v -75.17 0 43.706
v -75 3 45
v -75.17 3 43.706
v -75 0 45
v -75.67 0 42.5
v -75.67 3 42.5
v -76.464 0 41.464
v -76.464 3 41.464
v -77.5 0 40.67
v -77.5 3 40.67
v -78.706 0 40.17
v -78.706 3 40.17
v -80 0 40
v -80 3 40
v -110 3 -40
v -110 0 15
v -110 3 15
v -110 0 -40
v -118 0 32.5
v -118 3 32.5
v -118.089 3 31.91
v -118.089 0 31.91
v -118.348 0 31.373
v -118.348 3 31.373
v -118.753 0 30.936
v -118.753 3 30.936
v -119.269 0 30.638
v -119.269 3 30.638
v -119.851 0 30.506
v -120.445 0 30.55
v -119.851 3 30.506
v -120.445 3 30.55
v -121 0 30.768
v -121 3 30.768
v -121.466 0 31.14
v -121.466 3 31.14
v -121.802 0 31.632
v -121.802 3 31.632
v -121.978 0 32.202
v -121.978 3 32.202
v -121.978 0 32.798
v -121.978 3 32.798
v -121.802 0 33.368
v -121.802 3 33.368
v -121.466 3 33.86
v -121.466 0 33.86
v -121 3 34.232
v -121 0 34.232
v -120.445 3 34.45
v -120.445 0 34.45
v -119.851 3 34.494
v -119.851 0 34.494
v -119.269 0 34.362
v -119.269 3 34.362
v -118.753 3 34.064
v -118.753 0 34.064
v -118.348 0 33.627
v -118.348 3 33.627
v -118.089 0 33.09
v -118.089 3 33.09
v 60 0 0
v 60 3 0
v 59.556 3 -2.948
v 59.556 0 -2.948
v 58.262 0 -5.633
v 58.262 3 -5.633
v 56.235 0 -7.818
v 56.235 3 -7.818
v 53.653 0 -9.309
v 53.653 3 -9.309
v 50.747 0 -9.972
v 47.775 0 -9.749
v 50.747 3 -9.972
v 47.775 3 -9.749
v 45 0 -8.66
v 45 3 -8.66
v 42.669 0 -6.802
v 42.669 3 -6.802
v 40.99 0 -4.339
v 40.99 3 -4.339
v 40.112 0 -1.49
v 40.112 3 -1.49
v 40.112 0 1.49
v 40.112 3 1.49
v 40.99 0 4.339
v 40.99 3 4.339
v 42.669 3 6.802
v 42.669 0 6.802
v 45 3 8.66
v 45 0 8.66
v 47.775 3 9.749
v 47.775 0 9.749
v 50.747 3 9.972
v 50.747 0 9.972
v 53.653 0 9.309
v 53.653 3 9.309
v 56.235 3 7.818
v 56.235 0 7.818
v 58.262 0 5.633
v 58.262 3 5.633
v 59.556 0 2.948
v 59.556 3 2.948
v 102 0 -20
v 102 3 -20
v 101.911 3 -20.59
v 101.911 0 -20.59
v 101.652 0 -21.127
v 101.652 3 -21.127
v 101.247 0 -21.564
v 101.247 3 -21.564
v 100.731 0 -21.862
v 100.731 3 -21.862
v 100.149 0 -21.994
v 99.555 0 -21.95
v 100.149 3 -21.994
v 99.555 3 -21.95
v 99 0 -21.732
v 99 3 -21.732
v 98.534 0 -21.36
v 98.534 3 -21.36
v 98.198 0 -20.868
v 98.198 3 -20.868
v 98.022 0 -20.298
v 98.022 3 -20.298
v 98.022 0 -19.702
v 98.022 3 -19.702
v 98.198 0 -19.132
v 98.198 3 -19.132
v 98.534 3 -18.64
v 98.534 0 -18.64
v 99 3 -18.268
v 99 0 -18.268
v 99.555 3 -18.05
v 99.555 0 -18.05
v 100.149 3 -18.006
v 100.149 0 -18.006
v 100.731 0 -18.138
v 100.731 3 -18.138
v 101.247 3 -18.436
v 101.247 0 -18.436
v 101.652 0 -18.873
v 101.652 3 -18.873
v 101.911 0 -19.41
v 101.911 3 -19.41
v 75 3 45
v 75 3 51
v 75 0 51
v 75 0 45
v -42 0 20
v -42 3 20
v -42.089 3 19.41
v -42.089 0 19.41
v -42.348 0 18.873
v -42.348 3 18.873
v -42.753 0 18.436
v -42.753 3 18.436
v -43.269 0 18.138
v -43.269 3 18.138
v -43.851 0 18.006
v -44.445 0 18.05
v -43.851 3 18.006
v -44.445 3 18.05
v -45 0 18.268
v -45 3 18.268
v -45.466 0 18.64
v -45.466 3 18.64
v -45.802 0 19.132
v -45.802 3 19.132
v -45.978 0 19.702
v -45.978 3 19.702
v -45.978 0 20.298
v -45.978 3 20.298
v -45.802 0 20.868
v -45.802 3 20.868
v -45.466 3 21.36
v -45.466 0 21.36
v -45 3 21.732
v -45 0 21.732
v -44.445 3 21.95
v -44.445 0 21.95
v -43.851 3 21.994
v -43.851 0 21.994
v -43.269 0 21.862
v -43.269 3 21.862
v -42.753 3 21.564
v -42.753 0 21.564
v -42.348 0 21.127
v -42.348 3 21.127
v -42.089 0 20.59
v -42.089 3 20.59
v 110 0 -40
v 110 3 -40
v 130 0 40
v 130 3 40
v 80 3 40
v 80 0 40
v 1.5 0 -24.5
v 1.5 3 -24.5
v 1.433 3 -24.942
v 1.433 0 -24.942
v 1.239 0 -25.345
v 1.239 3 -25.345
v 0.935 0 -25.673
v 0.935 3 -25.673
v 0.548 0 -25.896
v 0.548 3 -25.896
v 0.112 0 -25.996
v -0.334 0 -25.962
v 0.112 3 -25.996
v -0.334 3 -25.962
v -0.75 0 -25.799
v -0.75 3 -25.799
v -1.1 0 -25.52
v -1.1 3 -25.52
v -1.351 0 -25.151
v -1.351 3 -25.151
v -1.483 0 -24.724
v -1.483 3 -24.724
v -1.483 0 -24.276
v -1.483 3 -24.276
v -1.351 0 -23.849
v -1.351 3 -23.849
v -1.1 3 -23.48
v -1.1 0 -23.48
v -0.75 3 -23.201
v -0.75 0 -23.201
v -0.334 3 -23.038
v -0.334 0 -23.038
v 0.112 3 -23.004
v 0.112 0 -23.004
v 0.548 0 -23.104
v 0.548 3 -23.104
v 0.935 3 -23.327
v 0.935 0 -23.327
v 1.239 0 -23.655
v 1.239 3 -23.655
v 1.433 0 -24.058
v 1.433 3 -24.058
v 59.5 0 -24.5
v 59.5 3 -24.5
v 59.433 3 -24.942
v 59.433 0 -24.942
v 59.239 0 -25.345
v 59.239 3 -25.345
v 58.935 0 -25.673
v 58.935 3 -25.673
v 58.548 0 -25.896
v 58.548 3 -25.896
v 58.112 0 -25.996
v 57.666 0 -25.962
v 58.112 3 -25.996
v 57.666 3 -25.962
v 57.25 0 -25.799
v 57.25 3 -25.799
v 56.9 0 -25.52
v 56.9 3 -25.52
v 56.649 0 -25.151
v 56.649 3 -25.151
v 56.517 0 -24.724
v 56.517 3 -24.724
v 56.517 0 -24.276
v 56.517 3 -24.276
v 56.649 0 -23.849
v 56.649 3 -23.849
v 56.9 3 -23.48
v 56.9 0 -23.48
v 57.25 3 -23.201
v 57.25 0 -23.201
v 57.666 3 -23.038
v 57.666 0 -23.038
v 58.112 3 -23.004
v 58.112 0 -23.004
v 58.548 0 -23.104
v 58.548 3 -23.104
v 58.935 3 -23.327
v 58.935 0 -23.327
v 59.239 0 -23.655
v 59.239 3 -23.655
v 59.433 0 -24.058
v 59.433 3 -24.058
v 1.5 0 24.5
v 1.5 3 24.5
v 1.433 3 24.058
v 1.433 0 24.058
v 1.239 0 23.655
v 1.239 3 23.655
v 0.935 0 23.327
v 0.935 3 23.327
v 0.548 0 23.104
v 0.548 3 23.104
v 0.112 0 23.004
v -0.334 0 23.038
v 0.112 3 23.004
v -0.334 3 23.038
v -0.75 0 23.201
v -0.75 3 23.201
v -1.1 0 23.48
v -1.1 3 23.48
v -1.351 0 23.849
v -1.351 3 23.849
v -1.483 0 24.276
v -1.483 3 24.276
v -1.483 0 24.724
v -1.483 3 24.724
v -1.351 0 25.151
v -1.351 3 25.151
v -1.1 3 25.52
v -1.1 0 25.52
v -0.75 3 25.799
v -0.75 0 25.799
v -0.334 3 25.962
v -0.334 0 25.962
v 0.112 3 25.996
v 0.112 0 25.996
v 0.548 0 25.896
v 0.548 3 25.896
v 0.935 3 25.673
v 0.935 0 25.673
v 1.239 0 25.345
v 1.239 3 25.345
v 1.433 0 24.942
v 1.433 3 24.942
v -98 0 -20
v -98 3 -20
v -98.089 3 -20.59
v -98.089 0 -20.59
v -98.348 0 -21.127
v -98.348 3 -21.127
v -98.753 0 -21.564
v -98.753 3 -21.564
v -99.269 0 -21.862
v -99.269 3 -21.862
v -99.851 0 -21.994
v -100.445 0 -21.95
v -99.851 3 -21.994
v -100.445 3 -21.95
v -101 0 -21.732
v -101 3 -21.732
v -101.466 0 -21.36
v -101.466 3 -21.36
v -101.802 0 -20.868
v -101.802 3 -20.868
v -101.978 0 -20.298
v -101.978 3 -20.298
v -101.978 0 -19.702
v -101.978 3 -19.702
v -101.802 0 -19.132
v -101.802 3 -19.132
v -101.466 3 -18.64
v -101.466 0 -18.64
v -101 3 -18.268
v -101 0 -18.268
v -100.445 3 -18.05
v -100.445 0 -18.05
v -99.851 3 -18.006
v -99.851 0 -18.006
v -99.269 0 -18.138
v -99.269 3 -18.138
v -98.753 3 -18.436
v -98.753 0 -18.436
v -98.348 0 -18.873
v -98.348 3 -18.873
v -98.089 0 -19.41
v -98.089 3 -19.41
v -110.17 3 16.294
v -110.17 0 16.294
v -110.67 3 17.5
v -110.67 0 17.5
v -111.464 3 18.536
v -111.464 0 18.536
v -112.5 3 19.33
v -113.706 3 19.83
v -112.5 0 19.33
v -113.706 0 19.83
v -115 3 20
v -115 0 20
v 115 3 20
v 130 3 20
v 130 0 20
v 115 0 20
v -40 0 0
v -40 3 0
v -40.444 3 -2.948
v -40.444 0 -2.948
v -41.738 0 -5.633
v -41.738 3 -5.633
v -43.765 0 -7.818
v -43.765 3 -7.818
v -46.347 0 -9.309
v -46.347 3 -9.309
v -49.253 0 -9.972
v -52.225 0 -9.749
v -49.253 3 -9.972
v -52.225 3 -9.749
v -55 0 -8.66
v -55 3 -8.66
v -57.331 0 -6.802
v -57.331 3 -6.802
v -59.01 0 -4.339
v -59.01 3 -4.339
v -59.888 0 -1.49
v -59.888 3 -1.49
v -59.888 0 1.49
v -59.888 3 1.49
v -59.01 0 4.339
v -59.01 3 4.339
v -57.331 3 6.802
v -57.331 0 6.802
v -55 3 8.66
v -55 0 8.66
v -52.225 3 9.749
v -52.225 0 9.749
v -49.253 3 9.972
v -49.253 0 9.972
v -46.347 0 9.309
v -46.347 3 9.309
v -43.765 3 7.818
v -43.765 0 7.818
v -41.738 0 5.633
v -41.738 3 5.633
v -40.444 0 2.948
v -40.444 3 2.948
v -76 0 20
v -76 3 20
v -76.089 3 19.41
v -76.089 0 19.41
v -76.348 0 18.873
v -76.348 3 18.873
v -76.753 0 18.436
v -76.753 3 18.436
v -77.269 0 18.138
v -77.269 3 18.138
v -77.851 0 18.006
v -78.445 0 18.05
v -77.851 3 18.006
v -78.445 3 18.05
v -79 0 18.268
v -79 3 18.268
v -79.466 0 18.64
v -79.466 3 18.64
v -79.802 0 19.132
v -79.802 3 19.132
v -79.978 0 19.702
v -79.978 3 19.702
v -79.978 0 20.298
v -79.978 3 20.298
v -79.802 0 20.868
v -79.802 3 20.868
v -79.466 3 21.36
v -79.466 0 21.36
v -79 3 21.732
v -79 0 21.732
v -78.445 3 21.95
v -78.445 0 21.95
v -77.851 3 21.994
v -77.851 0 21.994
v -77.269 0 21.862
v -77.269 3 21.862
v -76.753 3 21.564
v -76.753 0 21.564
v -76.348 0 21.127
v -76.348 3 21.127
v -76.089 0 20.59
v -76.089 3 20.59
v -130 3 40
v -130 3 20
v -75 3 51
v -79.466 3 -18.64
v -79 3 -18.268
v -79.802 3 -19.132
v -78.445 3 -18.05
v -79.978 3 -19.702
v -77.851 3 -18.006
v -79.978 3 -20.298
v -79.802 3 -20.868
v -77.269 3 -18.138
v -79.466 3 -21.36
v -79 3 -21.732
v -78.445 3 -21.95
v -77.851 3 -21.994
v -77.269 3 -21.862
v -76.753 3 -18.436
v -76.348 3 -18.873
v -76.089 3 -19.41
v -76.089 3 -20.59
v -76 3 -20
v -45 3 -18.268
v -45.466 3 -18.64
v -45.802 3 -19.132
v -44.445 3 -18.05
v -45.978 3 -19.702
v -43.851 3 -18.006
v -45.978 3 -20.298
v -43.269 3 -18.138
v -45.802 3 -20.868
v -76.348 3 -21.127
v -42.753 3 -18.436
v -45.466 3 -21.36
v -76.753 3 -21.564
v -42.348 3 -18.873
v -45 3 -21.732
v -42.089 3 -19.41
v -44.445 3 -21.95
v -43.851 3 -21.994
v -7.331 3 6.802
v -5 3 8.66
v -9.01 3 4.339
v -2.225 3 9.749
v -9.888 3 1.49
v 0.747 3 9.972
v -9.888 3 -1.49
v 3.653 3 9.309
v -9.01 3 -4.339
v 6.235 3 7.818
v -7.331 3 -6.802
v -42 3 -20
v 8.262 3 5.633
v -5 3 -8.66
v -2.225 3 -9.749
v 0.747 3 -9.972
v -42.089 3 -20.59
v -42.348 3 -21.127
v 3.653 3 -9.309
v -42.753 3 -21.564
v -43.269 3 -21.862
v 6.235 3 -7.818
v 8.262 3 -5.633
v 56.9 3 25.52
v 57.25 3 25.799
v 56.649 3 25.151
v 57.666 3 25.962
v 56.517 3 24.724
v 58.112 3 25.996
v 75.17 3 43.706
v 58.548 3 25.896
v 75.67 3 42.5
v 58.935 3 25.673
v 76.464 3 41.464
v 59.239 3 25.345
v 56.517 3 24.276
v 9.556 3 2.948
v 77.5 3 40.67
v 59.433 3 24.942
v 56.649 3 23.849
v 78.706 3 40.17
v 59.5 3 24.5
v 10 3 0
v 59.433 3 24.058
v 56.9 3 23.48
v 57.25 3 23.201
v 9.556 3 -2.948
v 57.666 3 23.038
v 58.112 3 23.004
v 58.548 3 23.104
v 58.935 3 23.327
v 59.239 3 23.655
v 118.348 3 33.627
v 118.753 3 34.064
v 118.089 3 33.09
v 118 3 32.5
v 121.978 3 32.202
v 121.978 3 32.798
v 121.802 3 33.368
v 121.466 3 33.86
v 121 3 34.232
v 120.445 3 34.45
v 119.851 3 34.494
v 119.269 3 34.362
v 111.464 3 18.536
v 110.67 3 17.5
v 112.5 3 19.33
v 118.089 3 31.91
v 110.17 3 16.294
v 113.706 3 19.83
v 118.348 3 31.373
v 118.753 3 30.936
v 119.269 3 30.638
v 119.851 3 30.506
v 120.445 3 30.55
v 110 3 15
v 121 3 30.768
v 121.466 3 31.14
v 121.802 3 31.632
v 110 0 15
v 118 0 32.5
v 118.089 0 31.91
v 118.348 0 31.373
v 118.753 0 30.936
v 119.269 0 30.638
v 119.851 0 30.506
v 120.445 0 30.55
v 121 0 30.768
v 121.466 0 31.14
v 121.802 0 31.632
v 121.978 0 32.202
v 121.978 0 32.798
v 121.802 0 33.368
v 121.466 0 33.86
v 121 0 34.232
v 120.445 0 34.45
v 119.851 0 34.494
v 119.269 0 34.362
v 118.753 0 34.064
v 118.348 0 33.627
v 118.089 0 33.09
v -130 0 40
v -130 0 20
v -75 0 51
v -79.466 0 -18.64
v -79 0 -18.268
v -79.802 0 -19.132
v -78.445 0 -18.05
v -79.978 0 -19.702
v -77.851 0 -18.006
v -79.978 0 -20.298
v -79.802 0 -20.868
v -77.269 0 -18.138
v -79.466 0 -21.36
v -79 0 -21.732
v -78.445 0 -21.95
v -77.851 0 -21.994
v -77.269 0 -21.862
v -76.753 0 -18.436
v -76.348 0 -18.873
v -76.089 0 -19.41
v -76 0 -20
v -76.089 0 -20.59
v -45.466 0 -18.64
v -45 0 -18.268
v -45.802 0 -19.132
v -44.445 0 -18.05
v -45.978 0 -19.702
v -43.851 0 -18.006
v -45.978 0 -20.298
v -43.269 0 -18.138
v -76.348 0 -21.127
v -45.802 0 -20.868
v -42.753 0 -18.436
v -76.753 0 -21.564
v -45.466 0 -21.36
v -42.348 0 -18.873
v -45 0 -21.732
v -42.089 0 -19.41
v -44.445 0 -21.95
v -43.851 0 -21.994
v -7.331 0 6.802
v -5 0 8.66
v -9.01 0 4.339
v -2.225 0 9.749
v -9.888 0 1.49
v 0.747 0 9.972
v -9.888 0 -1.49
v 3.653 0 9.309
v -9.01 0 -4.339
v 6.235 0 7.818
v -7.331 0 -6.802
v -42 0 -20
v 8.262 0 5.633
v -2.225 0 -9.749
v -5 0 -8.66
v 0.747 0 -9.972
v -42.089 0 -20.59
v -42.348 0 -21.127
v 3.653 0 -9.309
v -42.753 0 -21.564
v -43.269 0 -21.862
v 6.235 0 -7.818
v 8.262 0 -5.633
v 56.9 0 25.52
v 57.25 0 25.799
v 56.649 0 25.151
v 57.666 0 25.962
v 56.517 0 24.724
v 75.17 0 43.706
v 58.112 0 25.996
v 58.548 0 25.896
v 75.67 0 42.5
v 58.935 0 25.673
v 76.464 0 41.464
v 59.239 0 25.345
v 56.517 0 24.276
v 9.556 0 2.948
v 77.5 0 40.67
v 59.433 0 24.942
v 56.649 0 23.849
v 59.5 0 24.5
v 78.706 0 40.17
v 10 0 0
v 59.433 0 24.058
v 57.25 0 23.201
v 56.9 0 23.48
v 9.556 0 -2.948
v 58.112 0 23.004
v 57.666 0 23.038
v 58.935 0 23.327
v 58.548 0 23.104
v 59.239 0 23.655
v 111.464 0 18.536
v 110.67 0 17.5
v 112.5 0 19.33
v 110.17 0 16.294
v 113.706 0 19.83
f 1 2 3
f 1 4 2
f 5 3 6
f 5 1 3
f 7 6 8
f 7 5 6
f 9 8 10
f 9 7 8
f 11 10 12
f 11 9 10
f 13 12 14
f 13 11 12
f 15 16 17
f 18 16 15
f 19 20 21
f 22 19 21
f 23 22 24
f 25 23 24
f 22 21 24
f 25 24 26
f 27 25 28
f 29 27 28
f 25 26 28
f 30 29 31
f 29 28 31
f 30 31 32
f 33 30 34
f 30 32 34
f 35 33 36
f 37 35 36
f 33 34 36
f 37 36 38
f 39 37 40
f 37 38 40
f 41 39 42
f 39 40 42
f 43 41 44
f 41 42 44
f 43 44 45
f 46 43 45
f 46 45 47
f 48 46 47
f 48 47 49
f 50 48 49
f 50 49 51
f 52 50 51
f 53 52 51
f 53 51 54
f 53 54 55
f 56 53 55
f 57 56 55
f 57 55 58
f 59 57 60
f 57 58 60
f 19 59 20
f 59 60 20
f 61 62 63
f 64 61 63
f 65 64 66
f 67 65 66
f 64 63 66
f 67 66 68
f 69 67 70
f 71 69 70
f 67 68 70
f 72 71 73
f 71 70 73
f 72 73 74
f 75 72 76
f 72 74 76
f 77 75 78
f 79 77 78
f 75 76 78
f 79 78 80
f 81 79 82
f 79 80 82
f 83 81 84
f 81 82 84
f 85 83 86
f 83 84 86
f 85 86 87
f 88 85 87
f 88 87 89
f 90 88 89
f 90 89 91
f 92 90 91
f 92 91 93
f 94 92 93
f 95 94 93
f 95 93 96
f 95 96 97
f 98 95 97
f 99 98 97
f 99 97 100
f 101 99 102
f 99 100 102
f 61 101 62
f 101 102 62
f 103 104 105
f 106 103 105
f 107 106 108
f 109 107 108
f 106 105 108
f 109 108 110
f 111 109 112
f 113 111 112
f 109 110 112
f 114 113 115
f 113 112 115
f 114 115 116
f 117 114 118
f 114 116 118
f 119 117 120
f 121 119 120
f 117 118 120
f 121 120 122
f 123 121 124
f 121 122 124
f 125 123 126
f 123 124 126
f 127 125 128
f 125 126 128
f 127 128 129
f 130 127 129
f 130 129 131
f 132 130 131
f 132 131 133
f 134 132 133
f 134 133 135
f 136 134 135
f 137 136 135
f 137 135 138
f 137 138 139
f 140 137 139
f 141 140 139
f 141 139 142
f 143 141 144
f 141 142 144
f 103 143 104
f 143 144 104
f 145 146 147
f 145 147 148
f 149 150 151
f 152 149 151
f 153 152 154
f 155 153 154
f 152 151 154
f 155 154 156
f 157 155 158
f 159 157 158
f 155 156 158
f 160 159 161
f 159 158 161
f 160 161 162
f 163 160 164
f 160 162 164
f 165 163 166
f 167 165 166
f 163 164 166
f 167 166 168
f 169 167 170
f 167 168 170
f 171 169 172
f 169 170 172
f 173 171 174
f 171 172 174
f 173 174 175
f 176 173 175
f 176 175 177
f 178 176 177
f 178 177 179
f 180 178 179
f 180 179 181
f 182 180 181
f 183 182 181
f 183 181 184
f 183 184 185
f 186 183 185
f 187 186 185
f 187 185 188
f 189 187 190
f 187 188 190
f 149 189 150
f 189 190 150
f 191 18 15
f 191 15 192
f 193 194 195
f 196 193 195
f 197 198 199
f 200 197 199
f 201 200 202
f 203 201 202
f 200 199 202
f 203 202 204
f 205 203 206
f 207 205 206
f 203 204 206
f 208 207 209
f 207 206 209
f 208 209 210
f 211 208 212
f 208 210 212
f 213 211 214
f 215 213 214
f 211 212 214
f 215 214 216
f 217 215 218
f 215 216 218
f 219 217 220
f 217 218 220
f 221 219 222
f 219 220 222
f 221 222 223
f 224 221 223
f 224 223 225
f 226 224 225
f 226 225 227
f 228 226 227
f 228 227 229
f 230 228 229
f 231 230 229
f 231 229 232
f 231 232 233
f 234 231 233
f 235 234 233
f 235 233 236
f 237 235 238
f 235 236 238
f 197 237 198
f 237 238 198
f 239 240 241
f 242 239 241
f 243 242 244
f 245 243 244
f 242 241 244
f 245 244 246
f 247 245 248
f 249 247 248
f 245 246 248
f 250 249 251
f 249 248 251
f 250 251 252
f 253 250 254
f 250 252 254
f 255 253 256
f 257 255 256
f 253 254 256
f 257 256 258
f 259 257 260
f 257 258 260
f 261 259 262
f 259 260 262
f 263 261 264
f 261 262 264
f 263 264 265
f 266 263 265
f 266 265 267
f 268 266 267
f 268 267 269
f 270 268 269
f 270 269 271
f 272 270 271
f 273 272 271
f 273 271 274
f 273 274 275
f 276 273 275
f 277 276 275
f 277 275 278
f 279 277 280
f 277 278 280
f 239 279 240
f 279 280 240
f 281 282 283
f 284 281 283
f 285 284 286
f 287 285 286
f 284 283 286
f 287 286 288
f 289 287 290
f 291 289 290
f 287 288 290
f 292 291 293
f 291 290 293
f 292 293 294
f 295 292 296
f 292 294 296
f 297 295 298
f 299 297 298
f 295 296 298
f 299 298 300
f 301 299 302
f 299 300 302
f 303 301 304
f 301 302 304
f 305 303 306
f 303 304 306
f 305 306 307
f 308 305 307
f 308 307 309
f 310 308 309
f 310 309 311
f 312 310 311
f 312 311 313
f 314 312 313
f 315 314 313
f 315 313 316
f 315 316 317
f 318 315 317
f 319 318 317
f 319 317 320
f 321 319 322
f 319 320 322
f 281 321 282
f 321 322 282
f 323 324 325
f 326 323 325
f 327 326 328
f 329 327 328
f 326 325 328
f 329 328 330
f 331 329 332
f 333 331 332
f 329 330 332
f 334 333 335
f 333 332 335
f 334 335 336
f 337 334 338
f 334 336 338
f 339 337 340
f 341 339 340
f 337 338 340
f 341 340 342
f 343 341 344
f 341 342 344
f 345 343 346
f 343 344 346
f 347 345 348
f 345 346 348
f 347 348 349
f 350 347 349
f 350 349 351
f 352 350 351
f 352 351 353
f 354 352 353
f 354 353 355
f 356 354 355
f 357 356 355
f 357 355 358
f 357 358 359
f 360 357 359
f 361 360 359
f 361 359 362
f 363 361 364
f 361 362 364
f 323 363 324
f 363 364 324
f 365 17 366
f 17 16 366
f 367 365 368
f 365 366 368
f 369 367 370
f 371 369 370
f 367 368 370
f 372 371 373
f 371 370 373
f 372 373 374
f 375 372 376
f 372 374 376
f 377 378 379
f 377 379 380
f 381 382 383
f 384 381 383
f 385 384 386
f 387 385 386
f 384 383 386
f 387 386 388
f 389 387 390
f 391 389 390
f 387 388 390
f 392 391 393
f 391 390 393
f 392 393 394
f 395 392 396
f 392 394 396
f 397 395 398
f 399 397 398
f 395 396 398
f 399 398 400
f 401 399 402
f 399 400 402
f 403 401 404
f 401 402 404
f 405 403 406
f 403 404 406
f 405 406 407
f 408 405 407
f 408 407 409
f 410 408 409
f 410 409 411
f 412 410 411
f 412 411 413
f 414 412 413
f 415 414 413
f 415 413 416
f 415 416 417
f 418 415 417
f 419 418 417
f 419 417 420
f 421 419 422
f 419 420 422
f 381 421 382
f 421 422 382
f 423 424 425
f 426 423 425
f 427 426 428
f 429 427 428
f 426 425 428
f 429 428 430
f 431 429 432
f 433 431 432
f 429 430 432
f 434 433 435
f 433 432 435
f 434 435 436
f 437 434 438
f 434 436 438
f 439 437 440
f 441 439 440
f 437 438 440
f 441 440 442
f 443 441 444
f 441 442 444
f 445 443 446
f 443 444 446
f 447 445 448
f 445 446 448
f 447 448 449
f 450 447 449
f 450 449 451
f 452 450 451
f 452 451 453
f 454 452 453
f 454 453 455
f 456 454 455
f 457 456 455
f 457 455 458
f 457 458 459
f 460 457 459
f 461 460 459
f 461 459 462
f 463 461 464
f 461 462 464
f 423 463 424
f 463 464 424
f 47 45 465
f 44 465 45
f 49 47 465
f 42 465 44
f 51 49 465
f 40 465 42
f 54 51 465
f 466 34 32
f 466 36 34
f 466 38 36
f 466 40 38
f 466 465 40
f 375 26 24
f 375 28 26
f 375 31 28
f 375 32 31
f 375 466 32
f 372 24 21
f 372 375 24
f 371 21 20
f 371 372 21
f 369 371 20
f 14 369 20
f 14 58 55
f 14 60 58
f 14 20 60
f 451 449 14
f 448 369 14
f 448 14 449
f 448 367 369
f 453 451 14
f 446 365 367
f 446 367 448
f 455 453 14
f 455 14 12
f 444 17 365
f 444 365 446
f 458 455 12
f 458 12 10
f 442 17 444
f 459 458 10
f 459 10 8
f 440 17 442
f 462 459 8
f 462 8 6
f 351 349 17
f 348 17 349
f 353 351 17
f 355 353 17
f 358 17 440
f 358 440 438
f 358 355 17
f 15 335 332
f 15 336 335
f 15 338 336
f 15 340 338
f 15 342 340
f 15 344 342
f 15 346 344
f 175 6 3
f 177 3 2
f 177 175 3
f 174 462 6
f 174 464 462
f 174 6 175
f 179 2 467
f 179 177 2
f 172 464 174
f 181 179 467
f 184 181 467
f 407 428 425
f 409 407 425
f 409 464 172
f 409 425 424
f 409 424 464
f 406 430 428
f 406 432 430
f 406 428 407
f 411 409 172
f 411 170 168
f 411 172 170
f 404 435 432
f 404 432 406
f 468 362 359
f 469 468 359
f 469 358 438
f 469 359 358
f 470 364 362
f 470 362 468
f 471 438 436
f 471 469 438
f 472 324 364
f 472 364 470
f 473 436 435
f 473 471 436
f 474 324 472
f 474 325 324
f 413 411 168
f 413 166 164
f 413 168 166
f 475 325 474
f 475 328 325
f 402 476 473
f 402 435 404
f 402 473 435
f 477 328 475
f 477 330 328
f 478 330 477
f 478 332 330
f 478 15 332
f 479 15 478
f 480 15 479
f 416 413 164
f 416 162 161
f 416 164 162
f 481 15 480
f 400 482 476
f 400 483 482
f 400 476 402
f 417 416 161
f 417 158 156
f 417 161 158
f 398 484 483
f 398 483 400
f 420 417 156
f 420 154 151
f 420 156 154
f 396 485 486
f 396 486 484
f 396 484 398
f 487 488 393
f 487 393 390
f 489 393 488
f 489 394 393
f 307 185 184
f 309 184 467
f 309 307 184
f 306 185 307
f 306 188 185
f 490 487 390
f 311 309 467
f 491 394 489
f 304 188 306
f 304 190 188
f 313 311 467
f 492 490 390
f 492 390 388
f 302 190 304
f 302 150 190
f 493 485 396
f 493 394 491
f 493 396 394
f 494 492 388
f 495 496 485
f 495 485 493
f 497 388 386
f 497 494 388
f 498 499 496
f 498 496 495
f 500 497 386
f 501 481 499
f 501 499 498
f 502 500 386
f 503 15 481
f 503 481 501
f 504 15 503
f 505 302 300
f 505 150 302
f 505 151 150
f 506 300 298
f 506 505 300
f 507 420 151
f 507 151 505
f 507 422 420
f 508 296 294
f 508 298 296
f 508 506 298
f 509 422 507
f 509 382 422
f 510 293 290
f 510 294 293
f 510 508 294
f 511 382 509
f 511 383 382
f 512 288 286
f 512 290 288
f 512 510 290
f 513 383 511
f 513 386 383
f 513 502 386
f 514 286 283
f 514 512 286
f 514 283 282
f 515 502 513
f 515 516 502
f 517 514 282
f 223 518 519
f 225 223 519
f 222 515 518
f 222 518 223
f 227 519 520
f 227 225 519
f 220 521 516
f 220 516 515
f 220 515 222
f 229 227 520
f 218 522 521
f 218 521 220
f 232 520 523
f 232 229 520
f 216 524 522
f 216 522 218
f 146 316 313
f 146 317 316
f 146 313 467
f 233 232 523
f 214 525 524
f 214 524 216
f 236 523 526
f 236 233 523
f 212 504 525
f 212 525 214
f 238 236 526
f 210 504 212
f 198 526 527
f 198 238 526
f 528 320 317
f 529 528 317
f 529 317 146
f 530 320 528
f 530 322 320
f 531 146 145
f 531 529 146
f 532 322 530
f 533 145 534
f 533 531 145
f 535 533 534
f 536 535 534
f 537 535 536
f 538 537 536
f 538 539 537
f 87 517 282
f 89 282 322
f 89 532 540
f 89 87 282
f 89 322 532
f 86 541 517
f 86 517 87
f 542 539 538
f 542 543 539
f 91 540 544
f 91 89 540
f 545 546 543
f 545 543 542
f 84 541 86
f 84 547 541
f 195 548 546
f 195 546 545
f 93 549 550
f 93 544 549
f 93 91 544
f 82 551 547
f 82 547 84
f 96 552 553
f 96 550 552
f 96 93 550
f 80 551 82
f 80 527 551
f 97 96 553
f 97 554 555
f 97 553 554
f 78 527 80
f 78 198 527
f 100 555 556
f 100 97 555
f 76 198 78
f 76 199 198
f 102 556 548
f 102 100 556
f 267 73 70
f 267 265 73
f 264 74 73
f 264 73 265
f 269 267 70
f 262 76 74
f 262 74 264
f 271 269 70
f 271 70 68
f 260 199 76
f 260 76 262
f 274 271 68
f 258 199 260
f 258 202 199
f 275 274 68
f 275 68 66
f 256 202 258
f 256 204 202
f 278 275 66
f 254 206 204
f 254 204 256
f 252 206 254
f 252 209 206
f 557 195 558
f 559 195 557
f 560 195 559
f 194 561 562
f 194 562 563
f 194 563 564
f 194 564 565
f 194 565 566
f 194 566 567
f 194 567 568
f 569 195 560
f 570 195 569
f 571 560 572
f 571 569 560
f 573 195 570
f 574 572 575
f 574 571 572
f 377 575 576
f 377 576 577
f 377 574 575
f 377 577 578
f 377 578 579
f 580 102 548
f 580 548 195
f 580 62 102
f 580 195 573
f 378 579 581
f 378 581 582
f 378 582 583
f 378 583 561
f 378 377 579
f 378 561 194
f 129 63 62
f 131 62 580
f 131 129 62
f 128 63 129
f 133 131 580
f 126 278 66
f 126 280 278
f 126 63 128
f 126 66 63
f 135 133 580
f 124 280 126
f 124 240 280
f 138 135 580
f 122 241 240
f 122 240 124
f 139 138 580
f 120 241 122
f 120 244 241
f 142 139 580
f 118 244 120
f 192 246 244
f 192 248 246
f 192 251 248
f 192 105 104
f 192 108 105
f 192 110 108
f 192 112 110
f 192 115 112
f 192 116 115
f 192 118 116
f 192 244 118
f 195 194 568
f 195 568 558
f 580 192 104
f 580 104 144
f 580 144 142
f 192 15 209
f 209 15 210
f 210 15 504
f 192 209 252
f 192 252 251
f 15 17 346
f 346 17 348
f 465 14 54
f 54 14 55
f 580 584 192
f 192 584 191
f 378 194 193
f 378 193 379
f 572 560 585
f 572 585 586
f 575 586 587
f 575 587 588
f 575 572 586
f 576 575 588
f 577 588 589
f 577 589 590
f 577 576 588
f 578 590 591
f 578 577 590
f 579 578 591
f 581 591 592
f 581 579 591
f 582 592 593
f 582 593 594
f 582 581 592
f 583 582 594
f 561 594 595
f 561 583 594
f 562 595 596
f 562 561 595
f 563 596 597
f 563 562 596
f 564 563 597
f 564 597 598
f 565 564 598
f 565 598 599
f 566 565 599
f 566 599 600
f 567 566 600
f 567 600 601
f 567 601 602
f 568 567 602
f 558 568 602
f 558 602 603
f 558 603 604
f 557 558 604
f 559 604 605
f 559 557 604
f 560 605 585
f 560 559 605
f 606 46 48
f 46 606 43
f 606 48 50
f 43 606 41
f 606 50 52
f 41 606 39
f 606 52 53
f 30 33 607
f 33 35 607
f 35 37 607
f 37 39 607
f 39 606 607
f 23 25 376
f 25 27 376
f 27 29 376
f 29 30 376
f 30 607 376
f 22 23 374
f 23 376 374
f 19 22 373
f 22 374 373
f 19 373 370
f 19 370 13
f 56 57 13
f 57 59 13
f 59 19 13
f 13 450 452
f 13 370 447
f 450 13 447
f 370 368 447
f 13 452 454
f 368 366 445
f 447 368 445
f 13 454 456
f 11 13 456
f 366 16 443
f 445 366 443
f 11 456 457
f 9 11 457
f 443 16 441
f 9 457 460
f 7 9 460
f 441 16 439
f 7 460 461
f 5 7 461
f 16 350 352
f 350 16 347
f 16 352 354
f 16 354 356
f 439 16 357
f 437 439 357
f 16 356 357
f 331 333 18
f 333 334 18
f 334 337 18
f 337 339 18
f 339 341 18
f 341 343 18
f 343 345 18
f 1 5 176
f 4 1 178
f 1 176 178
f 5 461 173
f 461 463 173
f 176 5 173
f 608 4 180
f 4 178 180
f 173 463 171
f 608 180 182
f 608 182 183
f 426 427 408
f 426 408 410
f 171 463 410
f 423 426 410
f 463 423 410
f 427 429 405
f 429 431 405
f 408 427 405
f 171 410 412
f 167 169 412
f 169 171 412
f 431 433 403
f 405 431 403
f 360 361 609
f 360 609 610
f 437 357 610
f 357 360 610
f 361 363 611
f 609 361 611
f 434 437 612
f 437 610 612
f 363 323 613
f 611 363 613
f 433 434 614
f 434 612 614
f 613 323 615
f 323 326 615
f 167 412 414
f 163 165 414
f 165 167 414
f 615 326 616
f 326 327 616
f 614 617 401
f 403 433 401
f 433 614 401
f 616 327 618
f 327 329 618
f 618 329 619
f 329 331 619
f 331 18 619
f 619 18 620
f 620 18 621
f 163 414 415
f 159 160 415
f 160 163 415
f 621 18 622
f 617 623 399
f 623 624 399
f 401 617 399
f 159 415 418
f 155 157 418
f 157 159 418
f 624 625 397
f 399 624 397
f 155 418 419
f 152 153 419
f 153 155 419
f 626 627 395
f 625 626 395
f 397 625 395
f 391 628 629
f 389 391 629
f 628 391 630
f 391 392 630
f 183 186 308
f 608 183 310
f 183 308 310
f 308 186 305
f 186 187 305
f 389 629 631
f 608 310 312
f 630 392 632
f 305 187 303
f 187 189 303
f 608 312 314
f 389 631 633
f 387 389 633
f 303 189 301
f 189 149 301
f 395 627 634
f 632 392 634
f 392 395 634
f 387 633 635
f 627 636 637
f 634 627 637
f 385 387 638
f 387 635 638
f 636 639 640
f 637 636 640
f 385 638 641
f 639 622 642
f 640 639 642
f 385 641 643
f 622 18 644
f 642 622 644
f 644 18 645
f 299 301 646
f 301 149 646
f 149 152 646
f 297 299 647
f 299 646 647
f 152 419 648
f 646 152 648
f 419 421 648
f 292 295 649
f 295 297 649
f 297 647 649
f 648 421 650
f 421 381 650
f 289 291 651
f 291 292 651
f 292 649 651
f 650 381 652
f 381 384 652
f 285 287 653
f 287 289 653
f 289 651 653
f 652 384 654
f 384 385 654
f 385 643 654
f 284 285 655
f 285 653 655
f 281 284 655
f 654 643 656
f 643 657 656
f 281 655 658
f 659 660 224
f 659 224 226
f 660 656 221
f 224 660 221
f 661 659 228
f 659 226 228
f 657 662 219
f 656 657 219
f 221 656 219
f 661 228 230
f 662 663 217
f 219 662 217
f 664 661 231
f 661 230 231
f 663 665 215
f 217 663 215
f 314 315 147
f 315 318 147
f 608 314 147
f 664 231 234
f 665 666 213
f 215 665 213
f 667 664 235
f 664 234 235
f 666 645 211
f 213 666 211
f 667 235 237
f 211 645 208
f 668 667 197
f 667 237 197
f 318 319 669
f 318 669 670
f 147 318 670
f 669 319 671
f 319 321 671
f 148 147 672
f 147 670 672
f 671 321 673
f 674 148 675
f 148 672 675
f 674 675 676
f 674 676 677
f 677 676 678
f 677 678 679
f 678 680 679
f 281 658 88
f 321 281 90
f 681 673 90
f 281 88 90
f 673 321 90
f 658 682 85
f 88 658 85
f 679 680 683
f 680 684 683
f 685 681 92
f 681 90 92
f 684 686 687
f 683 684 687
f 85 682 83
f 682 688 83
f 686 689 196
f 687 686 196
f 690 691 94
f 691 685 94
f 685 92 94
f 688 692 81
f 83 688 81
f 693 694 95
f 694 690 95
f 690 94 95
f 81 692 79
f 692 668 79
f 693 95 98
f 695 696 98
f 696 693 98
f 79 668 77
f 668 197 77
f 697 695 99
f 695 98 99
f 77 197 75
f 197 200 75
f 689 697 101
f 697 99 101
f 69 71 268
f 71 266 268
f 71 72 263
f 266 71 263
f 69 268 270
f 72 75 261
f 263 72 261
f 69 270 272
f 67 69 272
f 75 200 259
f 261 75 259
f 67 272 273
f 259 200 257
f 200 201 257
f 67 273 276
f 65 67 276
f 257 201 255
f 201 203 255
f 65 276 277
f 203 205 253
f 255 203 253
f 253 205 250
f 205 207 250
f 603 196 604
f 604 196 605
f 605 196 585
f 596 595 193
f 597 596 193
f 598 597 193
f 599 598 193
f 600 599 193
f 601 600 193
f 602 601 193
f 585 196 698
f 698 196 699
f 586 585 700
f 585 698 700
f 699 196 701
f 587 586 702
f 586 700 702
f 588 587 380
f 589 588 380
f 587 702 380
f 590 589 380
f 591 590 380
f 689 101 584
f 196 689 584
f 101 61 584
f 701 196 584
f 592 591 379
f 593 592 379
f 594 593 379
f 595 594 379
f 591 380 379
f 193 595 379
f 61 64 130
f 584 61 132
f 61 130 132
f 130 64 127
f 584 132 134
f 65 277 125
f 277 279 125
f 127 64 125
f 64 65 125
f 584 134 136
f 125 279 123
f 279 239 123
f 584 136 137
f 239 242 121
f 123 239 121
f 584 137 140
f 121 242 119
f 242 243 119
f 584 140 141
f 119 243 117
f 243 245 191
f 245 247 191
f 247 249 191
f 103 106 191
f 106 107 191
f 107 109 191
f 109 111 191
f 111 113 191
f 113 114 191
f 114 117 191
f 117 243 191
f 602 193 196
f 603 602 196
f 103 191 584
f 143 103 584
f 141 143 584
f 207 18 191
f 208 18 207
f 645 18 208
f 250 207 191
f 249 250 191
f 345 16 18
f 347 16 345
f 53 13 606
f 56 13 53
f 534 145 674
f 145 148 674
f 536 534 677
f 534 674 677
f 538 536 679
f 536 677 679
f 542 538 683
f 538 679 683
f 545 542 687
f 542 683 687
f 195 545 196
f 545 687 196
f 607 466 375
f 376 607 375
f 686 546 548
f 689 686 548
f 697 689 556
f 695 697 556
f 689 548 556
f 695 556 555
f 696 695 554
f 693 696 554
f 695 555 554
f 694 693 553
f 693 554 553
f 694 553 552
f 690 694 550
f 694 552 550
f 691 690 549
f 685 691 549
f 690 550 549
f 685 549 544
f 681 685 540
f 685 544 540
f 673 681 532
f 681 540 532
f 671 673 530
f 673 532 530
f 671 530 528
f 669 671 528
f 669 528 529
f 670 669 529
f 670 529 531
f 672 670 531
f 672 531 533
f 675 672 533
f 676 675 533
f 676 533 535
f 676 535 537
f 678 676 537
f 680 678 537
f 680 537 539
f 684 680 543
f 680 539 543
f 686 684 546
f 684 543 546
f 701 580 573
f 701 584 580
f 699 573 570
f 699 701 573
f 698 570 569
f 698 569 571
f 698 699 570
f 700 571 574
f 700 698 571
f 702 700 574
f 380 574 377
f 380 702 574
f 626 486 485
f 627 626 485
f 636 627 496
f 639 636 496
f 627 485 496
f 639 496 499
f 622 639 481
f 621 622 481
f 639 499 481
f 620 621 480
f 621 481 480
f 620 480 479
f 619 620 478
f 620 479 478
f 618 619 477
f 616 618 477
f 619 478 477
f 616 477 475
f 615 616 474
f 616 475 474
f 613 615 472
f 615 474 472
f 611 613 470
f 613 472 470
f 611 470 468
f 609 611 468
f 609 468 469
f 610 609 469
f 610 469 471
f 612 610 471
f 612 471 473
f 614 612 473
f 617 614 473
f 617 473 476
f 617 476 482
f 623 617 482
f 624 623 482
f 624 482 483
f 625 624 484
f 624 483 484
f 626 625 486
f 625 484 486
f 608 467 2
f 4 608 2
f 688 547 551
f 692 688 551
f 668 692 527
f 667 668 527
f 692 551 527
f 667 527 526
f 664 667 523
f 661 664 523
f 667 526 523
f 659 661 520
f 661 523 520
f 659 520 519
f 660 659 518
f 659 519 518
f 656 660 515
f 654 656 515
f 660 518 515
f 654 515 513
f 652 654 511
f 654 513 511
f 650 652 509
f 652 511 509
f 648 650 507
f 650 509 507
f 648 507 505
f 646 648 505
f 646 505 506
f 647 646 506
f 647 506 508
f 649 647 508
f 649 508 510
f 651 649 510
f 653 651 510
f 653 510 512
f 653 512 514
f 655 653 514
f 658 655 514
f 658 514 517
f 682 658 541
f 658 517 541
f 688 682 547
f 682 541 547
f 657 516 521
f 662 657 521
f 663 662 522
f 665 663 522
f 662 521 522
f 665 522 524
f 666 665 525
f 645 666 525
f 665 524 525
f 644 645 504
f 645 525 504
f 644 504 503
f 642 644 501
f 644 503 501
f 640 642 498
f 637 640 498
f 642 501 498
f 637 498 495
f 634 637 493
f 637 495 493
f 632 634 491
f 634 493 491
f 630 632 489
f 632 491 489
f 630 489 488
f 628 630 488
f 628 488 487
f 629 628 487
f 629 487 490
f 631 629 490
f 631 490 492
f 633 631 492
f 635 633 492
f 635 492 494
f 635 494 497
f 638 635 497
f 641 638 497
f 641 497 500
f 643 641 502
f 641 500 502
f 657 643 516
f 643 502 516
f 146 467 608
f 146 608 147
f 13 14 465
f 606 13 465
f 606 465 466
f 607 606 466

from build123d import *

# Parameters (mm, degrees)
SKETCH1_W           = 220
SKETCH1_H           = 80
BOSS_EXTRUDE1_DEPTH = 3
SKETCH2_W           = 20
SKETCH2_H           = 20
SKETCH2_R           = 2
BOSS_EXTRUDE2_DEPTH = 3
FILLET1_R           = 5
SKETCH3_R           = 2
CUT_EXTRUDE1_DEPTH  = 3
SKETCH4_R           = 1.5
CUT_EXTRUDE2_DEPTH  = 3
SKETCH5_W           = 150
SKETCH5_H           = 22
BOSS_EXTRUDE3_DEPTH = 3
FILLET2_R           = 5
SKETCH6_R           = 10
CUT_EXTRUDE3_DEPTH  = 3
SKETCH7_R           = 2
CUT_EXTRUDE4_DEPTH  = 3


with BuildPart() as part:
    # Sketch1 → Boss-Extrude1 (new body)
    with BuildSketch(Plane(origin=(0, 0, 0), x_dir=(1, 0, 0), z_dir=(0, 1, 0))):
        Rectangle(SKETCH1_W, SKETCH1_H)
    extrude(amount=BOSS_EXTRUDE1_DEPTH)

    # Sketch2 → Boss-Extrude2 (add)
    with BuildSketch(Plane(origin=(0, 3, 0), x_dir=(1, 0, 0), z_dir=(0, 1, 0))):
        with Locations((-120, -30)):
            Rectangle(SKETCH2_W, SKETCH2_H)
        with Locations((-120, -32.5)):
            Circle(SKETCH2_R, mode=Mode.SUBTRACT)
    boss_extrude2 = extrude(amount=-BOSS_EXTRUDE2_DEPTH)

    # Mirror1: Boss-Extrude2 across plane
    add(boss_extrude2.mirror(Plane(origin=(0, 0, 0), x_dir=(0, 0, 1), z_dir=(1, 0, 0))))

    # Fillet1
    fillet1_edges = [part.edges().sort_by_distance(p)[0] for p in [
        (-110, 1.5, 20),
        (110, 1.5, 20),
    ]]
    fillet(fillet1_edges, radius=FILLET1_R)

    # Sketch3 → Cut-Extrude1 (cut)
    with BuildSketch(Plane(origin=(0, 3, 0), x_dir=(1, 0, 0), z_dir=(0, 1, 0))):
        with Locations((-100, 20)):
            Circle(SKETCH3_R)
        with Locations((100, 20)):
            Circle(SKETCH3_R)
    extrude(amount=-CUT_EXTRUDE1_DEPTH, mode=Mode.SUBTRACT)

    # Sketch4 → Cut-Extrude2 (cut)
    with BuildSketch(Plane(origin=(0, 3, 0), x_dir=(1, 0, 0), z_dir=(0, 1, 0))):
        with Locations((0, 24.5)):
            Circle(SKETCH4_R)
        with Locations((58, 24.5)):
            Circle(SKETCH4_R)
        with Locations((58, -24.5)):
            Circle(SKETCH4_R)
        with Locations((0, -24.5)):
            Circle(SKETCH4_R)
    extrude(amount=-CUT_EXTRUDE2_DEPTH, mode=Mode.SUBTRACT)

    # Sketch5 → Boss-Extrude3 (add)
    with BuildSketch(Plane(origin=(0, 3, 0), x_dir=(1, 0, 0), z_dir=(0, 1, 0))):
        with Locations((0, -40)):
            Rectangle(SKETCH5_W, SKETCH5_H)
    extrude(amount=-BOSS_EXTRUDE3_DEPTH)

    # Fillet2
    fillet2_edges = [part.edges().sort_by_distance(p)[0] for p in [
        (-75, 1.5, 40),
        (75, 1.5, 40),
    ]]
    fillet(fillet2_edges, radius=FILLET2_R)

    # Sketch6 → Cut-Extrude3 (cut)
    with BuildSketch(Plane(origin=(0, 3, 0), x_dir=(1, 0, 0), z_dir=(0, 1, 0))):
        with Locations((-50, 0)):
            Circle(SKETCH6_R)
        Circle(SKETCH6_R)
        with Locations((50, 0)):
            Circle(SKETCH6_R)
    extrude(amount=-CUT_EXTRUDE3_DEPTH, mode=Mode.SUBTRACT)

    # Sketch7 → Cut-Extrude4 (cut)
    with BuildSketch(Plane(origin=(0, 3, 0), x_dir=(1, 0, 0), z_dir=(0, 1, 0))):
        with Locations((-78, 20)):
            Circle(SKETCH7_R)
        with Locations((-44, 20)):
            Circle(SKETCH7_R)
        with Locations((-44, -20)):
            Circle(SKETCH7_R)
        with Locations((-78, -20)):
            Circle(SKETCH7_R)
    extrude(amount=-CUT_EXTRUDE4_DEPTH, mode=Mode.SUBTRACT)


solid = part.part
